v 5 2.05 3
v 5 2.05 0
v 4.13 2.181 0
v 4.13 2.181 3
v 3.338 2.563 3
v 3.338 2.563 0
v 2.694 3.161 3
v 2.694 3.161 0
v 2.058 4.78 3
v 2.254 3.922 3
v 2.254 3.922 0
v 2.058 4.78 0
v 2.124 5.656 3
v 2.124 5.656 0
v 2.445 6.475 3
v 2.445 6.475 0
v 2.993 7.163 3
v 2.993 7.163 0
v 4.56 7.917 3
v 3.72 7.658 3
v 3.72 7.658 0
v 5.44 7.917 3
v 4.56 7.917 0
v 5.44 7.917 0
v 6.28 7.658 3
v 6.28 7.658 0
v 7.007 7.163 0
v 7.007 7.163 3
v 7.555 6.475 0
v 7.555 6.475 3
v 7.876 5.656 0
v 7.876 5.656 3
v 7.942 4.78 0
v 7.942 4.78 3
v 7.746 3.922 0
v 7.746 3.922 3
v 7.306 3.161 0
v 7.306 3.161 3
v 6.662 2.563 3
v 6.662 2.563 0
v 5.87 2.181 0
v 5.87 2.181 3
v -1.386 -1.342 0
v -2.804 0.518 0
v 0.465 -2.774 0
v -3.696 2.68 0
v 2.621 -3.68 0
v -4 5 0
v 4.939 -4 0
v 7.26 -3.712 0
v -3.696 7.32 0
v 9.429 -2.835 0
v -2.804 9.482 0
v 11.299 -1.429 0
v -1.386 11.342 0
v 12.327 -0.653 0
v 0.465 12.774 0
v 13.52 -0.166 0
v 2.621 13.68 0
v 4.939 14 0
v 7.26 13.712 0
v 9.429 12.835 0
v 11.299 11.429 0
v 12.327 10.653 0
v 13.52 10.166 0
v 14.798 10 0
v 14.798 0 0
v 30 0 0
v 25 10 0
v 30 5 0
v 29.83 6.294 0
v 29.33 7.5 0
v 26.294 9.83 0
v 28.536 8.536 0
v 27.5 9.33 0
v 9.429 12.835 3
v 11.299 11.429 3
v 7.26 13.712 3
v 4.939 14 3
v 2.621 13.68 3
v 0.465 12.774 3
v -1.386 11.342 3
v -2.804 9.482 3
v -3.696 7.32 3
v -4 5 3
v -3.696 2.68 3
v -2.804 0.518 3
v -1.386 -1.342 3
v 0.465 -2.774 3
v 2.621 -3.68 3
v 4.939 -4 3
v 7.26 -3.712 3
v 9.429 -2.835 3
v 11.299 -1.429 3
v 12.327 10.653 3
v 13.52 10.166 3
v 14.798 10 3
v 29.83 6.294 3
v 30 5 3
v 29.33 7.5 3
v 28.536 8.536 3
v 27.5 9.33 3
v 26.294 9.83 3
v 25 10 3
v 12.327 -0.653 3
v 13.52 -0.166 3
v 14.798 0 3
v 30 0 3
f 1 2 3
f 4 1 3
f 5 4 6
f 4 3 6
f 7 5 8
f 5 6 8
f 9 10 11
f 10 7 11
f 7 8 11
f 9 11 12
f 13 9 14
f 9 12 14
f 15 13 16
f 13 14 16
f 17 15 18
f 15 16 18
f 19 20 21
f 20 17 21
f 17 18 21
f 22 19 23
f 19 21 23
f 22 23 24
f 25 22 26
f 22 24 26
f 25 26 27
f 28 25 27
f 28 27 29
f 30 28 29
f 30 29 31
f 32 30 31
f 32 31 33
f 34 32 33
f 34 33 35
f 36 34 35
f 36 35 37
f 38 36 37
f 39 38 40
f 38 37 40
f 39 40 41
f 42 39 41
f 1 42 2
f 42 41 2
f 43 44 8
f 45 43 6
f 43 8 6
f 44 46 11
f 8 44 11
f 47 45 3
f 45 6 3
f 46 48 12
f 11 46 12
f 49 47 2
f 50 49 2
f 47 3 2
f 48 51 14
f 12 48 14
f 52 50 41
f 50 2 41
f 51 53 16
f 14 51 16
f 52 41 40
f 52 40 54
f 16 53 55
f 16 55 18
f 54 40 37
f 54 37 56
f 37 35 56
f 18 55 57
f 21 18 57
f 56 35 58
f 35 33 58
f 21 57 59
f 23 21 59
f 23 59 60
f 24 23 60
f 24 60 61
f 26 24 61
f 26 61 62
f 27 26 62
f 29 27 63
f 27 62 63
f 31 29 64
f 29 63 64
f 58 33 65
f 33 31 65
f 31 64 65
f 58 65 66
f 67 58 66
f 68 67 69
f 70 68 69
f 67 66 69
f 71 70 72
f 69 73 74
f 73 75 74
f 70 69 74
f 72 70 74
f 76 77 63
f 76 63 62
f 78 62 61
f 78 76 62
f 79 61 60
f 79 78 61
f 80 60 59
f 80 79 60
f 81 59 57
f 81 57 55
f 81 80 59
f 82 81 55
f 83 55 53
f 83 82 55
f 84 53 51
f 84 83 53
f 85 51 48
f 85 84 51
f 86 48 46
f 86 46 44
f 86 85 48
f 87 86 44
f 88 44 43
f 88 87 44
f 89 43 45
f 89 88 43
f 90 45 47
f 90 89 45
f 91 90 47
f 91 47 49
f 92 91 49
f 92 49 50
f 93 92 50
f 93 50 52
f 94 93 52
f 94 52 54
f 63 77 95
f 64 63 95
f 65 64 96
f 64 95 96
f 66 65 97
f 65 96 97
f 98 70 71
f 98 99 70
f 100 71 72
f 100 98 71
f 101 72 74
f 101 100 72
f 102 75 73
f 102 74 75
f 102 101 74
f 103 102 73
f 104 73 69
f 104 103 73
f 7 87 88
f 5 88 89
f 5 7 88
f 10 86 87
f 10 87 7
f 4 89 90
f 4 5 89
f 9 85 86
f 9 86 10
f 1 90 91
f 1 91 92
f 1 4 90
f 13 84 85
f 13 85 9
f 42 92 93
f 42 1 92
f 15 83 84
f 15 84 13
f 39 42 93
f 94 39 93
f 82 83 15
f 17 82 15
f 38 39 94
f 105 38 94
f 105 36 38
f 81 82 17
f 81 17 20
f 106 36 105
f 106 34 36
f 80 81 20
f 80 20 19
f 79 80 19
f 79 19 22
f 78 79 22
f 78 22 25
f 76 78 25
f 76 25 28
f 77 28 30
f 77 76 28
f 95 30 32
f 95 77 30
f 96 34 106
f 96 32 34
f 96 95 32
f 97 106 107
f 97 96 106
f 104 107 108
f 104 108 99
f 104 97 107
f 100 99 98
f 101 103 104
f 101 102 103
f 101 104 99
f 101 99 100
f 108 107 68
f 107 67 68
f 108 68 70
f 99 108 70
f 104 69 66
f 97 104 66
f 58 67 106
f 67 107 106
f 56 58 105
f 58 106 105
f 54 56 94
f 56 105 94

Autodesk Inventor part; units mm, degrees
ref_plane "YZ Plane" through (0, 0, 0) normal (1, 0, 0) x (0, 1, 0)
ref_plane "XZ Plane" through (0, 0, 0) normal (0, 1, 0) x (-1, 0, 0)
ref_plane "XY Plane" through (0, 0, 0) normal (0, 0, 1) x (1, 0, 0)
sketch "Sketch1" plane through (0, 0, 0) normal (0, 0, 1) x (1, 0, 0)
  line L0 (0, 0) -> (30, 0)
  line L1 (30, 0) -> (30, 10)
  line L2 (30, 10) -> (0, 10)
  line L3 (0, 10) -> (0, 0)
  dimension "d0" = 30
  dimension "d1" = 10
extrude "Extrusion1" add sketch "Sketch1" along normal blind 3
sketch "Sketch2" plane through (0, 0, 3) normal (0, 0, 1) x (1, 0, 0)
  line L0 (30, 10) -> (0, 10) projected
  line L1 (0, 0) -> (30, 0) projected
  line L2 (0, 10) -> (0, 0) projected
  point P0 (5, 5)
  dimension "d4" = 5
  dimension "d5" = 5
  dimension "d6" = 5
hole "Hole1" at (5, 5, 3) direction (0, 0, -1) diameter 5.9 end through all
fillet "Fillet2" radius 5 1 edges at (30, 10, 1.5)
sketch "Sketch4" plane through (0, 0, 3) normal (0, 0, 1) x (1, 0, 0)
  circle A0 centre (5, 5) radius 2.95 projected
  circle A1 centre (5, 5) radius 9
  circle A2 centre (5, 5) radius 2.95
  point P0 (0, 0)
  dimension "d16" = 18
extrude "Extrusion2" add sketch "Sketch4" against normal up to surface (3 mm away)
fillet "Fillet3" radius 5 2 edges at (12.4833, 10, 1.5) (12.4833, 0, 1.5)
equation "\"d4\" = d5"
properties part number "Selection_Lever 2" material "Nylon 6/6"
